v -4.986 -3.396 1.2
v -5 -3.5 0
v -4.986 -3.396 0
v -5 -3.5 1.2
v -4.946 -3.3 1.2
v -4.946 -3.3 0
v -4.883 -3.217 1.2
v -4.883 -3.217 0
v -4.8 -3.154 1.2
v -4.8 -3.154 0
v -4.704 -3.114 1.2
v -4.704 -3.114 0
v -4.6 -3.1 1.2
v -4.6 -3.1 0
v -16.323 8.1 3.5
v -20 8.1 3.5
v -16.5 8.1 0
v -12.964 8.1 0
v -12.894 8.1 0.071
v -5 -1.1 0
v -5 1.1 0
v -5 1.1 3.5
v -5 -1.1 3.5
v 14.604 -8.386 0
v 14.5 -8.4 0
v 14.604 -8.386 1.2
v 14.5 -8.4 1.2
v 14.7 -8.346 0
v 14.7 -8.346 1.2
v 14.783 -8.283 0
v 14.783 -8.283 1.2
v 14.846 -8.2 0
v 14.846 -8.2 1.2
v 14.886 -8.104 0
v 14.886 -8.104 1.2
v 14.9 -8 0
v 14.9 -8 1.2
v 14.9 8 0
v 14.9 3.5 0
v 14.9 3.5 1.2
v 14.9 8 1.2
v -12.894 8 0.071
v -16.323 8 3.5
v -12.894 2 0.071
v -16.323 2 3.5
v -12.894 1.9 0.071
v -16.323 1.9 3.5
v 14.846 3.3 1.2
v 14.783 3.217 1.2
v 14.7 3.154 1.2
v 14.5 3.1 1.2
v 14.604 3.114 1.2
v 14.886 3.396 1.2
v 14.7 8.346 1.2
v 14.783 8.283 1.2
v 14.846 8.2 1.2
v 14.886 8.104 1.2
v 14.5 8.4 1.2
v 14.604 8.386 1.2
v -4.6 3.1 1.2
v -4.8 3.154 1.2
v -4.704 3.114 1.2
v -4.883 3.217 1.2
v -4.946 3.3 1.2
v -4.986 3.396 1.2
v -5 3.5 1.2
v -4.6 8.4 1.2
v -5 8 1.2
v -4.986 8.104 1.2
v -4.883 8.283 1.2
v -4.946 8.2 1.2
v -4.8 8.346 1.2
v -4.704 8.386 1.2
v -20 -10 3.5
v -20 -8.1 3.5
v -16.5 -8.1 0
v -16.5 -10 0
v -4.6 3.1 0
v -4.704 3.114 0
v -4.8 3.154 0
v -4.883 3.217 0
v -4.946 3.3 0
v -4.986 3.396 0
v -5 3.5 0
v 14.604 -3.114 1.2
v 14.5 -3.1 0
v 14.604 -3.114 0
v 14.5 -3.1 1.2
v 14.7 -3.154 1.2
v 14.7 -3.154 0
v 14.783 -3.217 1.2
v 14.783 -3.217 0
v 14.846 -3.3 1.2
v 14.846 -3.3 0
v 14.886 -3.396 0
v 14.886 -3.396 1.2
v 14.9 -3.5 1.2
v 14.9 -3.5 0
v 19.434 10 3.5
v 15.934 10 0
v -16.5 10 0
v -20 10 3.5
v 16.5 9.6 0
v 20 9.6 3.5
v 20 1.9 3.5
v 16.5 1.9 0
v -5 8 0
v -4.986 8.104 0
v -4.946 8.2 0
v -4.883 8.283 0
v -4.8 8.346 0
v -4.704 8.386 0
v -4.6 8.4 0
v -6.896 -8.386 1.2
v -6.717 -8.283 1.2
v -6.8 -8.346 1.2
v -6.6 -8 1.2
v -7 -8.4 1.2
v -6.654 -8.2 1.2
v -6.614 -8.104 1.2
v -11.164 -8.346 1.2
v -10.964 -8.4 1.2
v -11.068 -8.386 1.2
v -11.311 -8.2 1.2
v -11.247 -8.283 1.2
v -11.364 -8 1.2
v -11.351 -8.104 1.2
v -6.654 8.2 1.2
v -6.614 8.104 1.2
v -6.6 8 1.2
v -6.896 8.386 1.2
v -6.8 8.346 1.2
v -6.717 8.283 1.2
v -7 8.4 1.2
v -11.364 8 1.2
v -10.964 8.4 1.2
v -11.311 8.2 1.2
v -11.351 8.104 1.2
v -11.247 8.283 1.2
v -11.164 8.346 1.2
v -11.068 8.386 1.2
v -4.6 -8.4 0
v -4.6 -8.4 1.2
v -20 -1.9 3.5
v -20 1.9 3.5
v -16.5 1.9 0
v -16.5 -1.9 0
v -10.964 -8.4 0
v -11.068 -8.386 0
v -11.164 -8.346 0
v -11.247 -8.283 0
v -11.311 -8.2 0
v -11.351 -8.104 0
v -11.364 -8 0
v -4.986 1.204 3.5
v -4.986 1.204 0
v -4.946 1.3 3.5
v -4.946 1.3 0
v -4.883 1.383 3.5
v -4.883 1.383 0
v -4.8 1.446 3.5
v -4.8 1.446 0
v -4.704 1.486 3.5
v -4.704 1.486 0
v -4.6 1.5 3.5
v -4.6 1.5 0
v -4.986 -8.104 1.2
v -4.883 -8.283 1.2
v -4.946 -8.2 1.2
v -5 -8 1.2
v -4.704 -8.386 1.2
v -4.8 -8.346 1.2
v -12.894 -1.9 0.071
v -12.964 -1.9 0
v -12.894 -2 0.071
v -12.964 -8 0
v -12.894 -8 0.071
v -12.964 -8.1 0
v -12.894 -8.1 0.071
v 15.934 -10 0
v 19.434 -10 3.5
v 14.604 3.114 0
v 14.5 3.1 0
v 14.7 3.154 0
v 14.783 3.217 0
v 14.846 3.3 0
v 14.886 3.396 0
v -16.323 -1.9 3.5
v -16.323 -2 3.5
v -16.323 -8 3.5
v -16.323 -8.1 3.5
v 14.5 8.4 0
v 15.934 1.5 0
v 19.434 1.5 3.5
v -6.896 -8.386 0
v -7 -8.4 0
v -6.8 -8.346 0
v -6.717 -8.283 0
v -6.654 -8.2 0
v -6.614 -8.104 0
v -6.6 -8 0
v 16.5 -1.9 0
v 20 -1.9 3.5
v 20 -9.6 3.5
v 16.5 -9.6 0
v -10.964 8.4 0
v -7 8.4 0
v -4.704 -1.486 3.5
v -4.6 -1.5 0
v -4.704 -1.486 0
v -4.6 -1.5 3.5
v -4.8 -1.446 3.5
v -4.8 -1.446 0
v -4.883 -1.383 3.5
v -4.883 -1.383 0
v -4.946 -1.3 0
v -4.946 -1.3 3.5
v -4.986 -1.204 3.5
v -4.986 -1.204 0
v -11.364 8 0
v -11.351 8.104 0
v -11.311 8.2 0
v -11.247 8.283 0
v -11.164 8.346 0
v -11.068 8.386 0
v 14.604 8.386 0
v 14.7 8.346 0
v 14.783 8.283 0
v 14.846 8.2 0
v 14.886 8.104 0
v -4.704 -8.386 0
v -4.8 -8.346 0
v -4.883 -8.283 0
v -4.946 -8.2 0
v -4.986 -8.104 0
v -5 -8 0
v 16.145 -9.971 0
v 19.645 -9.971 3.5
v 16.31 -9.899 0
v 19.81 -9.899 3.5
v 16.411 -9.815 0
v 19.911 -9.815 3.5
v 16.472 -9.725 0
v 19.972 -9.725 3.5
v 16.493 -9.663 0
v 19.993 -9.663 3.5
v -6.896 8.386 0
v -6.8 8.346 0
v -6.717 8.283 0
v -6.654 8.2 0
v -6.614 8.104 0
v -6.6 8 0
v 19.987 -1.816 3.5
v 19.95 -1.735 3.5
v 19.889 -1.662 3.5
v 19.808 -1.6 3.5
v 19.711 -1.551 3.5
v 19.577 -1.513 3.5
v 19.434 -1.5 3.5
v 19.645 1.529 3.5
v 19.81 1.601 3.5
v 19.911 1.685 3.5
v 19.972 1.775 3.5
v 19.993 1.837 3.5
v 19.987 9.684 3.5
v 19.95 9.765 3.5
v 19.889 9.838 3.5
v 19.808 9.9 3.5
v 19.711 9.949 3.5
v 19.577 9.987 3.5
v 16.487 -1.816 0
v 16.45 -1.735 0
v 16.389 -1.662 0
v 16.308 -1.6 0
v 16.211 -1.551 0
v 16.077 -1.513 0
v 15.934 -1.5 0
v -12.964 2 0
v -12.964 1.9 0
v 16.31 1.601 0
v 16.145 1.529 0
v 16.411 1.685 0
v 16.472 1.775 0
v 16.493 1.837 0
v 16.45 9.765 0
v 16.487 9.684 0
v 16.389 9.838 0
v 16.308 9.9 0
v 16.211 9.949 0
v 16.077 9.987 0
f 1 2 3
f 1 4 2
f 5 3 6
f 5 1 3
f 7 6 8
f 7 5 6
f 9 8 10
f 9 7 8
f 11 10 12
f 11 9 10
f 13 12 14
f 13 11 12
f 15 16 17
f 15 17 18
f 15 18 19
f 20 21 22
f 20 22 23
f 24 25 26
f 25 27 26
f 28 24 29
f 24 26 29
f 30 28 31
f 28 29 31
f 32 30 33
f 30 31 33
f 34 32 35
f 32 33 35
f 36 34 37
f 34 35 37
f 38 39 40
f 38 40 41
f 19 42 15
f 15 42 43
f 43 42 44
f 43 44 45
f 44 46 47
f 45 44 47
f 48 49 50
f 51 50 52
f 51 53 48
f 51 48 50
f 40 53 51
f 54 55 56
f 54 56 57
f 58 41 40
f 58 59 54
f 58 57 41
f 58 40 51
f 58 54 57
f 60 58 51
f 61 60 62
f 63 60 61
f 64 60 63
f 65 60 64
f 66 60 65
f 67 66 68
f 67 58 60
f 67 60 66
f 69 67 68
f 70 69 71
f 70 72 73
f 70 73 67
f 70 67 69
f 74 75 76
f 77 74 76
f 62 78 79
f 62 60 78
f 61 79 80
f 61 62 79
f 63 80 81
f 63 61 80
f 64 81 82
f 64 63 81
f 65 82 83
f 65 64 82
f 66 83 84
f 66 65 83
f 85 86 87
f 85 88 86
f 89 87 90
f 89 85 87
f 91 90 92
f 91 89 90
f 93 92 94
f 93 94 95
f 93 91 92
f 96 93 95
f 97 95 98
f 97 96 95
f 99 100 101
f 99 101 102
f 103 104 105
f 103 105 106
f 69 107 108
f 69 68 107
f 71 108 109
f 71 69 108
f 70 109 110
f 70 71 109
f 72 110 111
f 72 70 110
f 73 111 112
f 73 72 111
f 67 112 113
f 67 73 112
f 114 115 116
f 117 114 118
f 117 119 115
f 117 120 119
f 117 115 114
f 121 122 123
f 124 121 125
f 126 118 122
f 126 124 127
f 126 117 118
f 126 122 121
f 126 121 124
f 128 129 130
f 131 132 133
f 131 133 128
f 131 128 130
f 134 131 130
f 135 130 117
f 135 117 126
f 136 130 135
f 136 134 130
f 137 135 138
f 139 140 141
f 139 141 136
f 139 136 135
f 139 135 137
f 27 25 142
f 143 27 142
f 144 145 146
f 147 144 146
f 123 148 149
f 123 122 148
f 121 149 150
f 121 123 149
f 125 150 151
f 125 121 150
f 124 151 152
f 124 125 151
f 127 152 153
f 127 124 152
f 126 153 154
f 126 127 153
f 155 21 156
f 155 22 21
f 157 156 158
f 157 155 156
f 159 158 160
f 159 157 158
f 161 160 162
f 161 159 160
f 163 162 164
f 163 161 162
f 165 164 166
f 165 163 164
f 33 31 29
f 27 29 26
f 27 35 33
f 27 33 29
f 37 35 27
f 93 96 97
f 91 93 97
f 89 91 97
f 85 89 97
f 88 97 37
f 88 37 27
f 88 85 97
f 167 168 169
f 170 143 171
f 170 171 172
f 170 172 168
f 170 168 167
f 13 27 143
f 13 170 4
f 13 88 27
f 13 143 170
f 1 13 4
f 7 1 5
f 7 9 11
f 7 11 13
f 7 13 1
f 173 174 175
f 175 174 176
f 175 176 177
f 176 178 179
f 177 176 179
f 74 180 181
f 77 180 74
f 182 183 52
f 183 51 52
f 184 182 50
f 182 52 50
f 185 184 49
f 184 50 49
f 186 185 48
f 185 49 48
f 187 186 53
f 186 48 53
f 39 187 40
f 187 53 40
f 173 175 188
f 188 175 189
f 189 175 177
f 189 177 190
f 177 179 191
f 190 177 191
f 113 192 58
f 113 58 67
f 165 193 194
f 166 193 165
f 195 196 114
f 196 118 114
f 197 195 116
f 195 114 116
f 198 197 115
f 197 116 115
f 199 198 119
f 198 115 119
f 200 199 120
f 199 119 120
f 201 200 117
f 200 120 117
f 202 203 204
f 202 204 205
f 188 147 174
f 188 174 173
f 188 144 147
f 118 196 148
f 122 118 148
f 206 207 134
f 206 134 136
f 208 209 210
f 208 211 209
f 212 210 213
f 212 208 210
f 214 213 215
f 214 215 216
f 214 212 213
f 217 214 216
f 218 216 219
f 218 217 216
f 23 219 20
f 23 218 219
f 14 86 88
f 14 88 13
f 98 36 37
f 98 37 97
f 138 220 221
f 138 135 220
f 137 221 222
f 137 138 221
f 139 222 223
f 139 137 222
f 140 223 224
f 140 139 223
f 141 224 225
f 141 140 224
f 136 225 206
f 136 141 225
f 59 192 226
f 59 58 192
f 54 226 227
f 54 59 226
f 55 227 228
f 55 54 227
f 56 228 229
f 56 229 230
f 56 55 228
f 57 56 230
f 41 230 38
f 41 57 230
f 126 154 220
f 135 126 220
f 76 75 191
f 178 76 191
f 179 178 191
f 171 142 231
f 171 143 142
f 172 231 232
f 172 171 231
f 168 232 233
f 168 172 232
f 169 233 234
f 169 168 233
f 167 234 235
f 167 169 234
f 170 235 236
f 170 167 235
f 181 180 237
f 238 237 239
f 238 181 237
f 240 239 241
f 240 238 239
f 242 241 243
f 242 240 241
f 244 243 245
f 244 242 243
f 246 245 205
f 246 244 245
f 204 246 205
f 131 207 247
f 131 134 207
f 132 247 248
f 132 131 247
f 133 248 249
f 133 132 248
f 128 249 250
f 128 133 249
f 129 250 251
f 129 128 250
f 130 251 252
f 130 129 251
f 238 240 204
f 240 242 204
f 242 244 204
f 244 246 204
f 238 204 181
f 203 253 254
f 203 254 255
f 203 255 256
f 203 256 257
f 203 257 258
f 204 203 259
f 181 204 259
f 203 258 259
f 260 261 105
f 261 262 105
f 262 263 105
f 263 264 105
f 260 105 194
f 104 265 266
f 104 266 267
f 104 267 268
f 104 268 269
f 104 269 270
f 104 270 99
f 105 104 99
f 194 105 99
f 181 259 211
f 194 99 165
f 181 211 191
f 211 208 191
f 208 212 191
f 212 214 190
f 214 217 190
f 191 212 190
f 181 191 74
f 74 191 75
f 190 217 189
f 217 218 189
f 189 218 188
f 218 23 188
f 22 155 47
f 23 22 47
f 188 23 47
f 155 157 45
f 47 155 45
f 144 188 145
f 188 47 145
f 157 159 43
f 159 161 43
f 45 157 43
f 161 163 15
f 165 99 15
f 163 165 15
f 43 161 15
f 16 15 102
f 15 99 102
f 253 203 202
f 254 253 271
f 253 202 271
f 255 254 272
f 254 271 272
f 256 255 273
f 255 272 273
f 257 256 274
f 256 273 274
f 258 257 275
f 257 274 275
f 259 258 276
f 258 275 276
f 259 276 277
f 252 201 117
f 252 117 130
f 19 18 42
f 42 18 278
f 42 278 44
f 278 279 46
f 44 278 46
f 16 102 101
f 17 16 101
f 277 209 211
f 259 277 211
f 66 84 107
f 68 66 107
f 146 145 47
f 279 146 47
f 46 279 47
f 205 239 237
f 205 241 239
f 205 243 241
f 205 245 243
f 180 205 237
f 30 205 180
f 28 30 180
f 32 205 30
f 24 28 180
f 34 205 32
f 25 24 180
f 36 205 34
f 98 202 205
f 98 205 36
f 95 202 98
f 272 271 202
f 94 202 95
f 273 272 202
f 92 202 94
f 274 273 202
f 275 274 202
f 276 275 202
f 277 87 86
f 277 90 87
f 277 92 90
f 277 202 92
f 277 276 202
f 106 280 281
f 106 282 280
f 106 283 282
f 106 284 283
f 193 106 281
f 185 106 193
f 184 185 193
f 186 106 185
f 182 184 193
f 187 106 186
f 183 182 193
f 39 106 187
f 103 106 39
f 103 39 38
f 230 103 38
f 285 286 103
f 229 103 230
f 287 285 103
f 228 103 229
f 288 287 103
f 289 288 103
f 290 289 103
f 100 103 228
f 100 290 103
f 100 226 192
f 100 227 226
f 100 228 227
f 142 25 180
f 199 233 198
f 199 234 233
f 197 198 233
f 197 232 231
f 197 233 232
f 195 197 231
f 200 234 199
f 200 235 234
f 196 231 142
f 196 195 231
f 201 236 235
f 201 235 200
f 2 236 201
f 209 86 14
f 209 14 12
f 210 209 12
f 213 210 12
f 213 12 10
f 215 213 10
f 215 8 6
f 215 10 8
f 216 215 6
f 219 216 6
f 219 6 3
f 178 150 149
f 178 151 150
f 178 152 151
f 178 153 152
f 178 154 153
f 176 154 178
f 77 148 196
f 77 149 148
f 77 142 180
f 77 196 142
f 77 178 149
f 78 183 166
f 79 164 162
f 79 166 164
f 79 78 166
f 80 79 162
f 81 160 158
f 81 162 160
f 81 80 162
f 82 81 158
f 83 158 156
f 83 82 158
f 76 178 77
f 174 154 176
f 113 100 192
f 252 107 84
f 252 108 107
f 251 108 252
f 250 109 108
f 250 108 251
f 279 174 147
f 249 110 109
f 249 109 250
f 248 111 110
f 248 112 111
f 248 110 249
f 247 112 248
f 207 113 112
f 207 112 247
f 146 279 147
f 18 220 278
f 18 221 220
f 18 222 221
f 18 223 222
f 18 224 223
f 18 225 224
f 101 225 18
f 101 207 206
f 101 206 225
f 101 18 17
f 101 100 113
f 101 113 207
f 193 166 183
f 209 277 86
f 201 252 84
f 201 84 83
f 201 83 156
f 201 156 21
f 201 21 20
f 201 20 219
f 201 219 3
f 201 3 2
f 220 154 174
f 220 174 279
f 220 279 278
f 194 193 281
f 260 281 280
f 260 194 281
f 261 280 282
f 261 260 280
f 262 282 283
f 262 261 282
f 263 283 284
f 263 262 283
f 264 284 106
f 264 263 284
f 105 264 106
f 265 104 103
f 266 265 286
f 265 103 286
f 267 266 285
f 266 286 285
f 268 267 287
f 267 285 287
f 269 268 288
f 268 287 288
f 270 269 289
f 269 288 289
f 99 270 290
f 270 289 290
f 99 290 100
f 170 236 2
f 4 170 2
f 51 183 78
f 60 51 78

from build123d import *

# Parameters (mm, degrees)
BOSS_EXTRUDE1_DEPTH = 3.5
CUT_EXTRUDE1_DEPTH  = 29.5
CUT_EXTRUDE2_DEPTH  = 29.5
CAVITY1_START       = -8
CAVITY1_DEPTH       = 6
CAVITY1_START_2     = 2
CAVITY1_2_DEPTH     = 6
SKETCH4_W           = 4.949747468
SKETCH4_H           = 6
CUT_EXTRUDE3_DEPTH  = 0.1
CUT_EXTRUDE4_DEPTH  = 0.1
CUT_EXTRUDE5_DEPTH  = 0.1
CUT_EXTRUDE6_DEPTH  = 0.1
CUT_EXTRUDE7_DEPTH  = 0.1
SKETCH9_W           = 19.9
SKETCH9_H           = 5.3
SKETCH9_W_2         = 4.764466094
SKETCH9_H_2         = 16.8
CUT_EXTRUDE8_DEPTH  = 1.2
FILLET1_R           = 0.4


# Read off the part's stored shape, not the designer's step: Cavity1
with BuildPart() as part:
    # Sketch1 → Boss-Extrude1 (new body)
    with BuildSketch(Plane.XY):
        Polygon((20, -1.5), (20, -10), (-20, -10), (-20, 10), (20, 10), (20, 1.5), (-5, 1.5), (-5, -1.5), align=None)
    extrude(amount=BOSS_EXTRUDE1_DEPTH)

    # Sketch2 → Cut-Extrude1 (cut, through all)
    with BuildSketch(Plane(origin=(0, 10, 0), x_dir=(1, 0, 0), z_dir=(0, 1, 0))):
        Polygon((20, -3.5), (16.5, 0), (20, 0), align=None)
    extrude(amount=-CUT_EXTRUDE1_DEPTH, mode=Mode.SUBTRACT)

    # Sketch3 → Cut-Extrude2 (cut, through all)
    with BuildSketch(Plane(origin=(0, 10, 0), x_dir=(1, 0, 0), z_dir=(0, 1, 0))):
        Polygon((-20, -3.5), (-16.5, 0), (-20, 0), align=None)
    extrude(amount=-CUT_EXTRUDE2_DEPTH, mode=Mode.SUBTRACT)

    # Cavity1 outline → Cavity1 (cut)
    with BuildSketch(Plane(origin=(0, 0, 0), x_dir=(1, 0, 0), z_dir=(0, 1, 0)).offset(CAVITY1_START)):
        Polygon((-16.464466094, -3.5), (-12.964466094, 0), (-16.5, 0), (-20, -3.5), align=None)
    extrude(amount=CAVITY1_DEPTH, mode=Mode.SUBTRACT)

    # Cavity1 2 outline → Cavity1 2 (cut)
    with BuildSketch(Plane(origin=(0, 0, 0), x_dir=(1, 0, 0), z_dir=(0, 1, 0)).offset(CAVITY1_START_2)):
        Polygon((-16.464466094, -3.5), (-12.964466094, 0), (-16.5, 0), (-20, -3.5), align=None)
    extrude(amount=CAVITY1_2_DEPTH, mode=Mode.SUBTRACT)

    # Sketch4 → Cut-Extrude3 (cut)
    with BuildSketch(Plane(origin=(-6.482233047, 0, -6.482233047), x_dir=(-0.7071067811865464, 0, 0.7071067811865488), z_dir=(-0.7071067811865488, 0, -0.7071067811865464))):
        with Locations((11.642135624, -5)):
            Rectangle(SKETCH4_W, SKETCH4_H)
        with Locations((11.642135624, 5)):
            Rectangle(SKETCH4_W, SKETCH4_H)
    extrude(amount=-CUT_EXTRUDE3_DEPTH, mode=Mode.SUBTRACT)

    # Sketch5 → Cut-Extrude4 (cut)
    with BuildSketch(Plane.XZ.offset(2)):
        Polygon((-16.5, 0), (-12.964466094, 0), (-12.893755416, 0.070710678), (-16.323044738, 3.5), (-20, 3.5), align=None)
    extrude(amount=-CUT_EXTRUDE4_DEPTH, mode=Mode.SUBTRACT)

    # Sketch6 → Cut-Extrude5 (cut)
    with BuildSketch(Plane.XZ.offset(-8)):
        Polygon((-16.323044738, 3.5), (-20, 3.5), (-16.5, 0), (-12.964466094, 0), (-12.893755416, 0.070710678), align=None)
    extrude(amount=-CUT_EXTRUDE5_DEPTH, mode=Mode.SUBTRACT)

    # Sketch7 → Cut-Extrude6 (cut)
    with BuildSketch(Plane(origin=(0, 2, 0), x_dir=(1, 0, 0), z_dir=(0, 1, 0))):
        Polygon((-20, -3.5), (-16.323044738, -3.5), (-12.893755416, -0.070710678), (-12.964466094, 0), (-16.5, 0), align=None)
    extrude(amount=-CUT_EXTRUDE6_DEPTH, mode=Mode.SUBTRACT)

    # Sketch8 → Cut-Extrude7 (cut)
    with BuildSketch(Plane(origin=(0, -8, 0), x_dir=(1, 0, 0), z_dir=(0, 1, 0))):
        Polygon((-20, -3.5), (-16.323044738, -3.5), (-12.893755416, -0.070710678), (-12.964466094, 0), (-16.5, 0), align=None)
    extrude(amount=-CUT_EXTRUDE7_DEPTH, mode=Mode.SUBTRACT)

    # Sketch9 → Cut-Extrude8 (cut)
    with BuildSketch(Plane(origin=(0, 0, 0), x_dir=(-1, 0, 0), z_dir=(0, 0, -1))):
        with Locations((-4.95, 5.75)):
            Rectangle(SKETCH9_W, SKETCH9_H)
        with Locations((-4.95, -5.75)):
            Rectangle(SKETCH9_W, SKETCH9_H)
        with Locations((8.982233047, 0)):
            Rectangle(SKETCH9_W_2, SKETCH9_H_2)
    extrude(amount=-CUT_EXTRUDE8_DEPTH, mode=Mode.SUBTRACT)

    # Fillet1
    fillet1_edges = [part.edges().sort_by_distance(p)[0] for p in [
        (-5, 1.5, 1.75),
        (-5, -1.5, 1.75),
        (-6.6, -8.4, 0.6),
        (-6.6, 8.4, 0.6),
        (-11.364466094, 8.4, 0.6),
        (-11.364466094, -8.4, 0.6),
        (14.9, -8.4, 0.6),
        (14.9, -3.1, 0.6),
        (-5, -3.1, 0.6),
        (-5, -8.4, 0.6),
        (14.9, 3.1, 0.6),
        (14.9, 8.4, 0.6),
        (-5, 8.4, 0.6),
        (-5, 3.1, 0.6),
        (18.25, -1.5, 1.75),
        (18.25, -10, 1.75),
        (18.25, 1.5, 1.75),
        (18.25, 10, 1.75),
    ]]
    fillet(fillet1_edges, radius=FILLET1_R)


solid = part.part
